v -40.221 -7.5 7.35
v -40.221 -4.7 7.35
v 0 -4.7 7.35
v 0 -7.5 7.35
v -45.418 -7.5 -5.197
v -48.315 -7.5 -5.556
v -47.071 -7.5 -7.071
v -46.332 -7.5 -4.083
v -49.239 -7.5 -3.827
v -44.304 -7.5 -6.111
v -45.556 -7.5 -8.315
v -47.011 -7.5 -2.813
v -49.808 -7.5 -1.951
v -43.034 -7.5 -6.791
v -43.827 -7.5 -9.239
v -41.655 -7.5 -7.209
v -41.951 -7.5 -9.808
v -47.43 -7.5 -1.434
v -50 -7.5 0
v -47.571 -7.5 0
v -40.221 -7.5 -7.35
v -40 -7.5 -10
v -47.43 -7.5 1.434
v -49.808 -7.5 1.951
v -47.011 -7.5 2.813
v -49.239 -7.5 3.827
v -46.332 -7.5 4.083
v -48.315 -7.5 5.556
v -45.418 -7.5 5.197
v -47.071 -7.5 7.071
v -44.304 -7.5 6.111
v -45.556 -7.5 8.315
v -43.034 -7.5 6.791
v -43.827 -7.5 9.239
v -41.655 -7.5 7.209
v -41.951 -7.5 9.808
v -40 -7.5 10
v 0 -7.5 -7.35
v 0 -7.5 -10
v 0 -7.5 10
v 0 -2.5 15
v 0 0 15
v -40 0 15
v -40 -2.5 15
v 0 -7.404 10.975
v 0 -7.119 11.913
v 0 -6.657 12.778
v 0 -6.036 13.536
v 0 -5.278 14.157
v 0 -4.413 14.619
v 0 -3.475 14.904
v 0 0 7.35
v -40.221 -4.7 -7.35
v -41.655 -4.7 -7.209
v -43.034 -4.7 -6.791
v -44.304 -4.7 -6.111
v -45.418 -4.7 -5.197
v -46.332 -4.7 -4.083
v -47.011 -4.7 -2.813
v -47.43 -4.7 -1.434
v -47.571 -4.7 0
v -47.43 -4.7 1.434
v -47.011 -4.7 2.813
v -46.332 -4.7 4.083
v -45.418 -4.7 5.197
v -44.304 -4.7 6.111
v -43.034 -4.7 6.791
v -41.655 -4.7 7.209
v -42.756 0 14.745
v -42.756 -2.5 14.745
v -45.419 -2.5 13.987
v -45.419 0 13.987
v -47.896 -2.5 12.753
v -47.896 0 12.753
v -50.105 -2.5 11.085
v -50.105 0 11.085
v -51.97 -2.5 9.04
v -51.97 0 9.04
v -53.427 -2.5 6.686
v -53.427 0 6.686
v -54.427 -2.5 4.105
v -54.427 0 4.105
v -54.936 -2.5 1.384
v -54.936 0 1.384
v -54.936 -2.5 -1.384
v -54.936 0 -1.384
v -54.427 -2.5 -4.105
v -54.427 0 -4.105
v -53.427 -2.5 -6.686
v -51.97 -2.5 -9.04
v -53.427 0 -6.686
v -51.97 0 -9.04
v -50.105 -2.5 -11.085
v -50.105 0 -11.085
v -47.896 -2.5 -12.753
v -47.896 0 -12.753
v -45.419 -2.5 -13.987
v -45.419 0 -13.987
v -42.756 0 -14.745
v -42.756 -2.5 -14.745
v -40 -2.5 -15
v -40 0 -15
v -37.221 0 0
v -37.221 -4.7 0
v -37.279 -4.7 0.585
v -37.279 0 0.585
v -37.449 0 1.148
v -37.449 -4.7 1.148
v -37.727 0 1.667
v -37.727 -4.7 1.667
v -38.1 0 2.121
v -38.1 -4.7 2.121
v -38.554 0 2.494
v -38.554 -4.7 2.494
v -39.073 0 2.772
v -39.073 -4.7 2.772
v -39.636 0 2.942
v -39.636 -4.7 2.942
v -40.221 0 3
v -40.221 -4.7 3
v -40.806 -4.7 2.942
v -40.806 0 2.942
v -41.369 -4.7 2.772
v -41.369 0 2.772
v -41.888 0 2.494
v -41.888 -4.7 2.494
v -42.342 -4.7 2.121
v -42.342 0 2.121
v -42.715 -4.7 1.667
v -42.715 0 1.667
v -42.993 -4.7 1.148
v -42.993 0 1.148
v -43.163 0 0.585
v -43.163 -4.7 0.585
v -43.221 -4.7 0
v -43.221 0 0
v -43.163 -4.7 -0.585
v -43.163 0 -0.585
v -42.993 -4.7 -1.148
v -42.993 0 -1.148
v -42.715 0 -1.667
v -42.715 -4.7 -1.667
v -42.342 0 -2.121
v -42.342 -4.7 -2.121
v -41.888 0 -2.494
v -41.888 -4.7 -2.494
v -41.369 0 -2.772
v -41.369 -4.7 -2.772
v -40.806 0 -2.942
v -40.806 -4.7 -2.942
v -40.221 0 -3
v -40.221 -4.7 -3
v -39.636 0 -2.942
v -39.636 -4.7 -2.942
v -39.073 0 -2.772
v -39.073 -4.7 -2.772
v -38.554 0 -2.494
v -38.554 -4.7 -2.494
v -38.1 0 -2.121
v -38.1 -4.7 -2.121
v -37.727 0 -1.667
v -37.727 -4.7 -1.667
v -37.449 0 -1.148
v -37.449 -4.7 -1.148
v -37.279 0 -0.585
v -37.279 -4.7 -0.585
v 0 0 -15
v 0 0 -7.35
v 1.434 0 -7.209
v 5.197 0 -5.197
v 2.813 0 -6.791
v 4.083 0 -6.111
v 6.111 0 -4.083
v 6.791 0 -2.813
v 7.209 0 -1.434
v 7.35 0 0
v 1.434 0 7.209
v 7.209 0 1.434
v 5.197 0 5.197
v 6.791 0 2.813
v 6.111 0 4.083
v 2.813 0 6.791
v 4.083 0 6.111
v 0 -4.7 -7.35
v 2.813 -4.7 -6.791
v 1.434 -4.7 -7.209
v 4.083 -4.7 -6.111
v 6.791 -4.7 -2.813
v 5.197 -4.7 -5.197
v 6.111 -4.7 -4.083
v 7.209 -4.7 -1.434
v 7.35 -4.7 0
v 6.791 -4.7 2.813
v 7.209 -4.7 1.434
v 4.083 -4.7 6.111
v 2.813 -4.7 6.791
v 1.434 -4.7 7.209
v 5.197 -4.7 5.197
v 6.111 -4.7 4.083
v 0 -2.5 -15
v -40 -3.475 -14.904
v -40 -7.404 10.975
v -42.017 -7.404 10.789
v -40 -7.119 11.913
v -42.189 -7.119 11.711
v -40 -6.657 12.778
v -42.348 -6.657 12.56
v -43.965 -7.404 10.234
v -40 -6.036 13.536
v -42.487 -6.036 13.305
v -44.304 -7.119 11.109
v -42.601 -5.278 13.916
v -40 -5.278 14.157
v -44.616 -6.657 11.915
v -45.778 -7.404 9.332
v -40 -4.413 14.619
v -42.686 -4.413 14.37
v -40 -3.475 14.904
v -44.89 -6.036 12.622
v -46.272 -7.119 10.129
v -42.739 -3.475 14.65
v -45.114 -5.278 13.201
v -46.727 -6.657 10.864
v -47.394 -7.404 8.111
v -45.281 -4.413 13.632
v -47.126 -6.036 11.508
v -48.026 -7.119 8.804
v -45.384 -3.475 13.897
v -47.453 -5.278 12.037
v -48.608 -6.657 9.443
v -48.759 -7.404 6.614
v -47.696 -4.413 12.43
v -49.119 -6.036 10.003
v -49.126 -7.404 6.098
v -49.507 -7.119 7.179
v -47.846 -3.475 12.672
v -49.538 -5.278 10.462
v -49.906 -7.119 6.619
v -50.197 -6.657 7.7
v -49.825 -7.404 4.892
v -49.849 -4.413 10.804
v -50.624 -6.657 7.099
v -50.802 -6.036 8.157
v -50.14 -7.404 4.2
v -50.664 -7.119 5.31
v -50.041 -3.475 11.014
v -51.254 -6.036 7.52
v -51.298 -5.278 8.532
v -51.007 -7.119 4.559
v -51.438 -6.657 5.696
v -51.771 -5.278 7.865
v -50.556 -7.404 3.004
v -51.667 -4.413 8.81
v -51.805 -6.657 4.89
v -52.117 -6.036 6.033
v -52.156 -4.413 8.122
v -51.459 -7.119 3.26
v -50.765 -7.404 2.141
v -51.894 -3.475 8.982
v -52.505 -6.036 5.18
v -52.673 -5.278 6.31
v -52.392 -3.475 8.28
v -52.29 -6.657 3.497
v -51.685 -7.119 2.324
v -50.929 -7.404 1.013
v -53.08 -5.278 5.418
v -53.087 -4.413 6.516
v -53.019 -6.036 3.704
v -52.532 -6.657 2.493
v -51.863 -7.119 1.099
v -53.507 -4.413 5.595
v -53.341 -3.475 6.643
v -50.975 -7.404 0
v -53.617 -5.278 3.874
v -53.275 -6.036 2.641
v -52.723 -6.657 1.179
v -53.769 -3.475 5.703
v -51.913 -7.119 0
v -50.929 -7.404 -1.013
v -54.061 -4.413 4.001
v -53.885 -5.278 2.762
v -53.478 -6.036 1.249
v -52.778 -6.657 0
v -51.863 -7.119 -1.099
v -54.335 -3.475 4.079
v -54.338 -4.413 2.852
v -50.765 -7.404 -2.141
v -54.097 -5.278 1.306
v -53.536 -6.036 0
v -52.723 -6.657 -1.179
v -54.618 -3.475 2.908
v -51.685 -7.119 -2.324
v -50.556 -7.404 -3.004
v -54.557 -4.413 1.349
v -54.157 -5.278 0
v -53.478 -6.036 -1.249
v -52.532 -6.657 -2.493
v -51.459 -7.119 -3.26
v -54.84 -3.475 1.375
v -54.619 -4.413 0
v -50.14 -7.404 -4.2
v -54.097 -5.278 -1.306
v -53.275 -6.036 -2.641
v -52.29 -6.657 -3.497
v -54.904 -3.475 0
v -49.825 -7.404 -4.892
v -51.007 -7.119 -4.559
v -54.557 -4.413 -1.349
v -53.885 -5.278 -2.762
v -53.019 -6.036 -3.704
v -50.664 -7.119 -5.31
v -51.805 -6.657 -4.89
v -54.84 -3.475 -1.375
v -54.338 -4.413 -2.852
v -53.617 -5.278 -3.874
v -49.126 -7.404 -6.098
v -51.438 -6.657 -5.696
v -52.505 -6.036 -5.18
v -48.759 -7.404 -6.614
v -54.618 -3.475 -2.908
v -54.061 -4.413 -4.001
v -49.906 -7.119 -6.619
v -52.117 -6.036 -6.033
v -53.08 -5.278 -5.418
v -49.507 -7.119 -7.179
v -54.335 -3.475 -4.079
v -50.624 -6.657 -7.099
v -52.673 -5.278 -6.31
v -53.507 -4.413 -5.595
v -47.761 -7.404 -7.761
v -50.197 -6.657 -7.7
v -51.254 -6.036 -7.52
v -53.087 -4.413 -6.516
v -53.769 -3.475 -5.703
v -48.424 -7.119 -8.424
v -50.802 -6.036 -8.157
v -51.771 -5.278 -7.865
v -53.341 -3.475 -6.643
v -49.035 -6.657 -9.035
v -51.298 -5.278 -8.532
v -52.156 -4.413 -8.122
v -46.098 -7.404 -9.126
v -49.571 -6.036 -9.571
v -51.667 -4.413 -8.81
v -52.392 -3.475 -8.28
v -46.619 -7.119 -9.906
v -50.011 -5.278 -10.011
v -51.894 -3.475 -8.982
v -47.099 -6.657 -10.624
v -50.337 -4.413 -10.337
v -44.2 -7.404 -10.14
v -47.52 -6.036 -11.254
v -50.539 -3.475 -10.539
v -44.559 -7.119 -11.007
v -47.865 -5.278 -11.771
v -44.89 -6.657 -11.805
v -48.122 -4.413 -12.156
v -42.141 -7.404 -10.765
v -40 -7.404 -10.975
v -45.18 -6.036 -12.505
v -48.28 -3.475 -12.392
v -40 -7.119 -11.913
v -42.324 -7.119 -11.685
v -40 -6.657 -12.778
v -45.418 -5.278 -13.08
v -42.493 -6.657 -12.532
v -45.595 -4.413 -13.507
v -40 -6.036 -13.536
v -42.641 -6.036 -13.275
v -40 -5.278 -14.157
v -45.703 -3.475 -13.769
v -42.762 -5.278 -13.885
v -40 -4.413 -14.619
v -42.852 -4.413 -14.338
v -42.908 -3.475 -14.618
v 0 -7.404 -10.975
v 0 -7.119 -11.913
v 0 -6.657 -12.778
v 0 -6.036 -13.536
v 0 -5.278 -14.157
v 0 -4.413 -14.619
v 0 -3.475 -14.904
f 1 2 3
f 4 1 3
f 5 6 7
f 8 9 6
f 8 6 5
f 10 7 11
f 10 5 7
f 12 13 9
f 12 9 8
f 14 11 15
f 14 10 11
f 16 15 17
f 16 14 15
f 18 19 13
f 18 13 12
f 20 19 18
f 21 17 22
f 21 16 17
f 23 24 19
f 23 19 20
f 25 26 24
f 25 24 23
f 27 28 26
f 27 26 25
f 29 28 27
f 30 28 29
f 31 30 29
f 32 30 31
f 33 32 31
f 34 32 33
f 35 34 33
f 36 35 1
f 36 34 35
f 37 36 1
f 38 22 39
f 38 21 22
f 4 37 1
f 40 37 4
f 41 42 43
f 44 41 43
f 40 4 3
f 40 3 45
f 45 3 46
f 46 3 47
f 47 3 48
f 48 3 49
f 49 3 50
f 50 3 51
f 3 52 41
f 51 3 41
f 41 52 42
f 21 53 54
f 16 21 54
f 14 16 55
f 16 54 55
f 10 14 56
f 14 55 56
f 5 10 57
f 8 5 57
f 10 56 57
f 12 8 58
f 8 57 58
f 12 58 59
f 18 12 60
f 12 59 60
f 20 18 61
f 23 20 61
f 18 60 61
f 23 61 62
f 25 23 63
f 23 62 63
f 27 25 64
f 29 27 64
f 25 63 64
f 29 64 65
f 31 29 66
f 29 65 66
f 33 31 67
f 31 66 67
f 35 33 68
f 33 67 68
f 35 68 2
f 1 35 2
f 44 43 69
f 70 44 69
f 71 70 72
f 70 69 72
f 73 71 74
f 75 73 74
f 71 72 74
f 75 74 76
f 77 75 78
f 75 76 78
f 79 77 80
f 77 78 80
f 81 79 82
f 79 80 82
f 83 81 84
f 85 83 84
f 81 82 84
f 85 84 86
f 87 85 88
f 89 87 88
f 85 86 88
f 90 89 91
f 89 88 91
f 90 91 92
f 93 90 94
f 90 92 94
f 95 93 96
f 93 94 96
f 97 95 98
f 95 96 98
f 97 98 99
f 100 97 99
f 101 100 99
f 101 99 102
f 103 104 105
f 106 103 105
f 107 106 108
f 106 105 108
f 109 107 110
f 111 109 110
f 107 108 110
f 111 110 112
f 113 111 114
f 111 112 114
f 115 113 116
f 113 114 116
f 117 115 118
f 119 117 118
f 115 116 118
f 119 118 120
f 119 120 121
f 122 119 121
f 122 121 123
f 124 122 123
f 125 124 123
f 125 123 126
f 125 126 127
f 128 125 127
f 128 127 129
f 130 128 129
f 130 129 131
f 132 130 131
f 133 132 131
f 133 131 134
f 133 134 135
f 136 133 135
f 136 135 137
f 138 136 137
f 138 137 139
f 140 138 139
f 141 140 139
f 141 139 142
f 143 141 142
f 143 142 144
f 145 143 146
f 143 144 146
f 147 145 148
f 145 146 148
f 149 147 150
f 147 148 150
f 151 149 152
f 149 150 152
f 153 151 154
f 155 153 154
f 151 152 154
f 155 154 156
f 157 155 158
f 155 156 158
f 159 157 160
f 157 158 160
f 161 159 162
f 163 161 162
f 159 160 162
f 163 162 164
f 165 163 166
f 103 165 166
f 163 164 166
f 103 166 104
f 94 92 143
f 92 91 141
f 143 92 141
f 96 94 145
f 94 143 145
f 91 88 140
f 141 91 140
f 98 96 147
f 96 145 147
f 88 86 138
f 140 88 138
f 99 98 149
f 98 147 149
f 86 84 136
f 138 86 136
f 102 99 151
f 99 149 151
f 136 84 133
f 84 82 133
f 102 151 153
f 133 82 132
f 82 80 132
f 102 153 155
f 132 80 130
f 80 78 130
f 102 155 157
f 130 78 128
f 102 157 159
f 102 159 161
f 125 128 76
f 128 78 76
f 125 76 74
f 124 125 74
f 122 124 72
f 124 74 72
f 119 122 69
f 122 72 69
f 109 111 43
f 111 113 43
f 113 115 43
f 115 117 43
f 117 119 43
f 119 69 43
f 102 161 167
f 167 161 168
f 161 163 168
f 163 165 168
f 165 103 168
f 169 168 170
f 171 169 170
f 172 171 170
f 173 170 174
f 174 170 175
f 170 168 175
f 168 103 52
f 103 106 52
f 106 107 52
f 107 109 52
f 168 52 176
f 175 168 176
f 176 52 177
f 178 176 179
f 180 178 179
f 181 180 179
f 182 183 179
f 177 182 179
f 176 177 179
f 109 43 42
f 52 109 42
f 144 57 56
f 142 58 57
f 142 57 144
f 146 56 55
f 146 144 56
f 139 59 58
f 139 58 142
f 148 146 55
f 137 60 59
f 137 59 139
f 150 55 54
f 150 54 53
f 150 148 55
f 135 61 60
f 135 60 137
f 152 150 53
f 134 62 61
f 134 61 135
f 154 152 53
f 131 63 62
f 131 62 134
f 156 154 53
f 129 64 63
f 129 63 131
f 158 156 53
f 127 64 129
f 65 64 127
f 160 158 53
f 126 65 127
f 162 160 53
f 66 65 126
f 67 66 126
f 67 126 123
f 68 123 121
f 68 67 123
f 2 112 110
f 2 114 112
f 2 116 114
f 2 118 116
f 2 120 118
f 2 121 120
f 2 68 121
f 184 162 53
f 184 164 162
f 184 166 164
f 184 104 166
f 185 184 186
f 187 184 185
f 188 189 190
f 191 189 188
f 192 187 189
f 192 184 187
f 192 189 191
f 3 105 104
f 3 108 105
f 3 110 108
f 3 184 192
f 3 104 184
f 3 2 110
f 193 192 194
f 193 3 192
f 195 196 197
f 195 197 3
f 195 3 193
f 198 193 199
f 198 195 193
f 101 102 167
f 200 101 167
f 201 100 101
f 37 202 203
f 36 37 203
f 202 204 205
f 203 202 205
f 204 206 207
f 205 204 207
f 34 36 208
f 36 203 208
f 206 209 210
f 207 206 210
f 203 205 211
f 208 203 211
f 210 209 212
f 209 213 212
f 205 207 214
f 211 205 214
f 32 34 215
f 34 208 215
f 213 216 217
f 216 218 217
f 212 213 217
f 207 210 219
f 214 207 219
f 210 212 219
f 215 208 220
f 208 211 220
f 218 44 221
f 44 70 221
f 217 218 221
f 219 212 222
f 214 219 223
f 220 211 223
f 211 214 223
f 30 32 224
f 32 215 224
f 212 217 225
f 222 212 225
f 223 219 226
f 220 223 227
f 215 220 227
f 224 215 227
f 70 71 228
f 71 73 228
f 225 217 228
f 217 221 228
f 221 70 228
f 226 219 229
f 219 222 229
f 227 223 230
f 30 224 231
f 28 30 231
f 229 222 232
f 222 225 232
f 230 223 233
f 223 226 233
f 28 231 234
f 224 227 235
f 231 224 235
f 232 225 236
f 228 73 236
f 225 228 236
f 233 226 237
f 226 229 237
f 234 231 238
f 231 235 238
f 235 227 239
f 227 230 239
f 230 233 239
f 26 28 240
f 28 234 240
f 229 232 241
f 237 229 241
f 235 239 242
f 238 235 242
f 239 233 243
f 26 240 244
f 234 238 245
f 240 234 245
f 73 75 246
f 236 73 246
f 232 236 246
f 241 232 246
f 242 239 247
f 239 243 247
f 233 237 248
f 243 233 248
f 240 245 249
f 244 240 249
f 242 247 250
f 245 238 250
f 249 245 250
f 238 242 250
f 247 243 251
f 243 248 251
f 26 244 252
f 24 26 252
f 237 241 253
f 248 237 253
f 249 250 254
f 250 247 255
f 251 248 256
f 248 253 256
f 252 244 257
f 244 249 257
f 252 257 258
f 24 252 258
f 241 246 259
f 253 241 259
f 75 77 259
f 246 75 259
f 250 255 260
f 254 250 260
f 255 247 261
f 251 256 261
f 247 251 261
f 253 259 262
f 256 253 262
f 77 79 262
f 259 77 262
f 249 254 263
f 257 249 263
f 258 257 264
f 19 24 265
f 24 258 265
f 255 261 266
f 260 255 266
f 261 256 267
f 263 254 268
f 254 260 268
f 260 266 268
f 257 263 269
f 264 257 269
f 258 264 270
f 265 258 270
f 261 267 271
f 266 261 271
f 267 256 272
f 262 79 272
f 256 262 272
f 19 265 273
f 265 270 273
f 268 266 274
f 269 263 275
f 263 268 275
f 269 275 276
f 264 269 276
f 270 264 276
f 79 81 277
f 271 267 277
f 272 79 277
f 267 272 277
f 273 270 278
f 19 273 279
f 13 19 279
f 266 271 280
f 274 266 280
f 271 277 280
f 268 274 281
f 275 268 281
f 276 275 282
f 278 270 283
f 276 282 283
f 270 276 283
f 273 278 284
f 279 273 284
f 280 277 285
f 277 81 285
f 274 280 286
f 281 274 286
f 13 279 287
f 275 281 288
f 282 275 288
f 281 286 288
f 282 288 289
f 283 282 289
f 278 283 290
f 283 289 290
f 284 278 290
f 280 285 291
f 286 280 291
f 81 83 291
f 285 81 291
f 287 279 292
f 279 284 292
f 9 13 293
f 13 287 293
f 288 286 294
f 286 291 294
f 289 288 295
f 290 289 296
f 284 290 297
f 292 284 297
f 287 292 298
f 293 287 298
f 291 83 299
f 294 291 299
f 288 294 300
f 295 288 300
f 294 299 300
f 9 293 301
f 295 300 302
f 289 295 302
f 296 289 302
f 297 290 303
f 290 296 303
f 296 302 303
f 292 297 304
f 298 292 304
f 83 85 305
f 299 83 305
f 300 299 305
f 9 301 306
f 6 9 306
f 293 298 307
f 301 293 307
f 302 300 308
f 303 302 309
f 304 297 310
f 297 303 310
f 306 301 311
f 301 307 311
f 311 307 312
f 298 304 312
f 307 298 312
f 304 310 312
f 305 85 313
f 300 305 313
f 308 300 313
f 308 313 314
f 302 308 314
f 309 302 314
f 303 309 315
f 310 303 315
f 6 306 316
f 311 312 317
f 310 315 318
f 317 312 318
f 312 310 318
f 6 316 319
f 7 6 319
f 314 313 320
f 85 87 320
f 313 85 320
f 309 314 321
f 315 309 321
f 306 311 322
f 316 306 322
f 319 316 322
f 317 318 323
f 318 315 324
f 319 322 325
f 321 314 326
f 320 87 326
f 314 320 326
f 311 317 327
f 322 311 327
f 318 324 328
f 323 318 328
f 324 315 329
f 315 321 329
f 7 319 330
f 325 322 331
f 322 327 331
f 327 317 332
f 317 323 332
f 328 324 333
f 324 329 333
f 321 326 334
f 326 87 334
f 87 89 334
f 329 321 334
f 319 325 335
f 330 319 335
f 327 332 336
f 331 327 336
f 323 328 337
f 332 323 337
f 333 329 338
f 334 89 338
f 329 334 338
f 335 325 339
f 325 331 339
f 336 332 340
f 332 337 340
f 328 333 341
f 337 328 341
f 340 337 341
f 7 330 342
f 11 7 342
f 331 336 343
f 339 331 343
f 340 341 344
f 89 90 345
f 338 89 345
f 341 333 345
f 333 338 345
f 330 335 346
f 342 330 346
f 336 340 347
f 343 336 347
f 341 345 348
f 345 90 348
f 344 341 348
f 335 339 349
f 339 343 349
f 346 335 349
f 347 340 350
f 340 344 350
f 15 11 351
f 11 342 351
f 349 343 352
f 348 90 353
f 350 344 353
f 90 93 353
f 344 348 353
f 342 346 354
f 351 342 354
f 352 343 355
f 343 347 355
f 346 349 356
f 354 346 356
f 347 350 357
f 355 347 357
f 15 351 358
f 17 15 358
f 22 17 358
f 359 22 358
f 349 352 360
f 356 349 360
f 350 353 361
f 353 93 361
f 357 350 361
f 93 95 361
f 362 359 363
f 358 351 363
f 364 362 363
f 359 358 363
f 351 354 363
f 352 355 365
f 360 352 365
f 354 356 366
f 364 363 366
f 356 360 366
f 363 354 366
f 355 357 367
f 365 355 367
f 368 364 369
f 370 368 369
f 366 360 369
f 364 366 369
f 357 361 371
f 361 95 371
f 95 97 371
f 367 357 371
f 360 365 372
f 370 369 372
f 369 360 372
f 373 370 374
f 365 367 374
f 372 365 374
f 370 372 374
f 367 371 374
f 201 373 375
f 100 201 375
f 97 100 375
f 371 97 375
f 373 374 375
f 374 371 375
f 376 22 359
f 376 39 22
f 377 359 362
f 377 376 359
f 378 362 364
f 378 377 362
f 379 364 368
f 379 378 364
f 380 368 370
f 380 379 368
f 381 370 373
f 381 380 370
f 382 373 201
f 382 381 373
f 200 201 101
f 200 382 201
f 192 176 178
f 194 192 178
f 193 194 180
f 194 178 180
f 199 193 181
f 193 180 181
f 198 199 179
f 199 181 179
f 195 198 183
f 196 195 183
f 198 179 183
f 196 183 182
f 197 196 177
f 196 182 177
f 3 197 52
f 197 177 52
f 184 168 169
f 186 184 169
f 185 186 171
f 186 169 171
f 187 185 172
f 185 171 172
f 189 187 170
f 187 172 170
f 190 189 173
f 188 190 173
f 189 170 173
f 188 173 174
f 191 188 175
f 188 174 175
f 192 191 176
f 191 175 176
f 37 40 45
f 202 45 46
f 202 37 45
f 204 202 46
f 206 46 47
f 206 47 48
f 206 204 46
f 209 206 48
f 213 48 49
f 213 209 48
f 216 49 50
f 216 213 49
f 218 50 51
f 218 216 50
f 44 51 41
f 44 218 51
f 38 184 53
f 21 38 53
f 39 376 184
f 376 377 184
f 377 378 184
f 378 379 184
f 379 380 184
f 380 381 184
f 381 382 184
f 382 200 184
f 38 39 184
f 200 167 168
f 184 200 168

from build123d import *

# Parameters (mm, degrees)
F1_DEPTH = 7.5
F2_DEPTH = 4.7
F3_R     = 5
F4_R     = 3
F5_DEPTH = 25


with BuildPart() as f1:
    # F0 (on Front) → F1 (new body)
    with BuildSketch(Plane.XZ):
        with BuildLine():
            Line((-40.22098, 7.35), (0, 7.35))
            Line((0, 7.35), (0, 15))
            Line((0, 15), (-40, 15))
            ThreePointArc((-40, 15), (-55, 0), (-40, -15))
            Line((-40, -15), (0, -15))
            Line((0, -15), (0, -7.35))
            Line((0, -7.35), (-40.22098, -7.35))
            ThreePointArc((-40.22098, -7.35), (-47.57098, 0), (-40.22098, 7.35))
        make_face()
    extrude(amount=F1_DEPTH)

    # F0 (on Front) → F2 (join)
    with BuildSketch(Plane.XZ):
        with BuildLine():
            ThreePointArc((0, -7.35), (-7.35, 0), (0, 7.35))
            Line((0, 7.35), (-40.22098, 7.35))
            ThreePointArc((-40.22098, 7.35), (-35.023746, 5.197235), (-32.87098, 0))
            ThreePointArc((-32.87098, 0), (-35.023746, -5.197235), (-40.22098, -7.35))
            Line((-40.22098, -7.35), (0, -7.35))
        make_face()
        with BuildLine():
            ThreePointArc((-32.87098, 0), (-35.023746, 5.197235), (-40.22098, 7.35))
            ThreePointArc((-40.22098, 7.35), (-47.57098, 0), (-40.22098, -7.35))
            ThreePointArc((-40.22098, -7.35), (-35.023746, -5.197235), (-32.87098, 0))
        make_face()
        with BuildLine():
            ThreePointArc((0, -7.35), (5.197235, -5.197235), (7.35, 0))
            ThreePointArc((7.35, 0), (5.197235, 5.197235), (0, 7.35))
            Line((0, 7.35), (0, 0))
            Line((0, 0), (0, -7.35))
        make_face()
        with BuildLine():
            Line((0, 0), (0, 7.35))
            ThreePointArc((0, 7.35), (-7.35, 0), (0, -7.35))
            Line((0, -7.35), (0, 0))
        make_face()
    extrude(amount=F2_DEPTH)

    # F3
    f3_edges = [f1.edges().sort_by_distance(p)[0] for p in [
        (-20, -7.5, 15),
    ]]
    fillet(f3_edges, radius=F3_R)

    # F4 (on face) → F5 (cut)
    with BuildSketch(Plane.XZ.offset(4.7)):
        with Locations((-40.22098, 0)):
            Circle(F4_R)
    extrude(amount=-F5_DEPTH, mode=Mode.SUBTRACT)


solid = f1.part
